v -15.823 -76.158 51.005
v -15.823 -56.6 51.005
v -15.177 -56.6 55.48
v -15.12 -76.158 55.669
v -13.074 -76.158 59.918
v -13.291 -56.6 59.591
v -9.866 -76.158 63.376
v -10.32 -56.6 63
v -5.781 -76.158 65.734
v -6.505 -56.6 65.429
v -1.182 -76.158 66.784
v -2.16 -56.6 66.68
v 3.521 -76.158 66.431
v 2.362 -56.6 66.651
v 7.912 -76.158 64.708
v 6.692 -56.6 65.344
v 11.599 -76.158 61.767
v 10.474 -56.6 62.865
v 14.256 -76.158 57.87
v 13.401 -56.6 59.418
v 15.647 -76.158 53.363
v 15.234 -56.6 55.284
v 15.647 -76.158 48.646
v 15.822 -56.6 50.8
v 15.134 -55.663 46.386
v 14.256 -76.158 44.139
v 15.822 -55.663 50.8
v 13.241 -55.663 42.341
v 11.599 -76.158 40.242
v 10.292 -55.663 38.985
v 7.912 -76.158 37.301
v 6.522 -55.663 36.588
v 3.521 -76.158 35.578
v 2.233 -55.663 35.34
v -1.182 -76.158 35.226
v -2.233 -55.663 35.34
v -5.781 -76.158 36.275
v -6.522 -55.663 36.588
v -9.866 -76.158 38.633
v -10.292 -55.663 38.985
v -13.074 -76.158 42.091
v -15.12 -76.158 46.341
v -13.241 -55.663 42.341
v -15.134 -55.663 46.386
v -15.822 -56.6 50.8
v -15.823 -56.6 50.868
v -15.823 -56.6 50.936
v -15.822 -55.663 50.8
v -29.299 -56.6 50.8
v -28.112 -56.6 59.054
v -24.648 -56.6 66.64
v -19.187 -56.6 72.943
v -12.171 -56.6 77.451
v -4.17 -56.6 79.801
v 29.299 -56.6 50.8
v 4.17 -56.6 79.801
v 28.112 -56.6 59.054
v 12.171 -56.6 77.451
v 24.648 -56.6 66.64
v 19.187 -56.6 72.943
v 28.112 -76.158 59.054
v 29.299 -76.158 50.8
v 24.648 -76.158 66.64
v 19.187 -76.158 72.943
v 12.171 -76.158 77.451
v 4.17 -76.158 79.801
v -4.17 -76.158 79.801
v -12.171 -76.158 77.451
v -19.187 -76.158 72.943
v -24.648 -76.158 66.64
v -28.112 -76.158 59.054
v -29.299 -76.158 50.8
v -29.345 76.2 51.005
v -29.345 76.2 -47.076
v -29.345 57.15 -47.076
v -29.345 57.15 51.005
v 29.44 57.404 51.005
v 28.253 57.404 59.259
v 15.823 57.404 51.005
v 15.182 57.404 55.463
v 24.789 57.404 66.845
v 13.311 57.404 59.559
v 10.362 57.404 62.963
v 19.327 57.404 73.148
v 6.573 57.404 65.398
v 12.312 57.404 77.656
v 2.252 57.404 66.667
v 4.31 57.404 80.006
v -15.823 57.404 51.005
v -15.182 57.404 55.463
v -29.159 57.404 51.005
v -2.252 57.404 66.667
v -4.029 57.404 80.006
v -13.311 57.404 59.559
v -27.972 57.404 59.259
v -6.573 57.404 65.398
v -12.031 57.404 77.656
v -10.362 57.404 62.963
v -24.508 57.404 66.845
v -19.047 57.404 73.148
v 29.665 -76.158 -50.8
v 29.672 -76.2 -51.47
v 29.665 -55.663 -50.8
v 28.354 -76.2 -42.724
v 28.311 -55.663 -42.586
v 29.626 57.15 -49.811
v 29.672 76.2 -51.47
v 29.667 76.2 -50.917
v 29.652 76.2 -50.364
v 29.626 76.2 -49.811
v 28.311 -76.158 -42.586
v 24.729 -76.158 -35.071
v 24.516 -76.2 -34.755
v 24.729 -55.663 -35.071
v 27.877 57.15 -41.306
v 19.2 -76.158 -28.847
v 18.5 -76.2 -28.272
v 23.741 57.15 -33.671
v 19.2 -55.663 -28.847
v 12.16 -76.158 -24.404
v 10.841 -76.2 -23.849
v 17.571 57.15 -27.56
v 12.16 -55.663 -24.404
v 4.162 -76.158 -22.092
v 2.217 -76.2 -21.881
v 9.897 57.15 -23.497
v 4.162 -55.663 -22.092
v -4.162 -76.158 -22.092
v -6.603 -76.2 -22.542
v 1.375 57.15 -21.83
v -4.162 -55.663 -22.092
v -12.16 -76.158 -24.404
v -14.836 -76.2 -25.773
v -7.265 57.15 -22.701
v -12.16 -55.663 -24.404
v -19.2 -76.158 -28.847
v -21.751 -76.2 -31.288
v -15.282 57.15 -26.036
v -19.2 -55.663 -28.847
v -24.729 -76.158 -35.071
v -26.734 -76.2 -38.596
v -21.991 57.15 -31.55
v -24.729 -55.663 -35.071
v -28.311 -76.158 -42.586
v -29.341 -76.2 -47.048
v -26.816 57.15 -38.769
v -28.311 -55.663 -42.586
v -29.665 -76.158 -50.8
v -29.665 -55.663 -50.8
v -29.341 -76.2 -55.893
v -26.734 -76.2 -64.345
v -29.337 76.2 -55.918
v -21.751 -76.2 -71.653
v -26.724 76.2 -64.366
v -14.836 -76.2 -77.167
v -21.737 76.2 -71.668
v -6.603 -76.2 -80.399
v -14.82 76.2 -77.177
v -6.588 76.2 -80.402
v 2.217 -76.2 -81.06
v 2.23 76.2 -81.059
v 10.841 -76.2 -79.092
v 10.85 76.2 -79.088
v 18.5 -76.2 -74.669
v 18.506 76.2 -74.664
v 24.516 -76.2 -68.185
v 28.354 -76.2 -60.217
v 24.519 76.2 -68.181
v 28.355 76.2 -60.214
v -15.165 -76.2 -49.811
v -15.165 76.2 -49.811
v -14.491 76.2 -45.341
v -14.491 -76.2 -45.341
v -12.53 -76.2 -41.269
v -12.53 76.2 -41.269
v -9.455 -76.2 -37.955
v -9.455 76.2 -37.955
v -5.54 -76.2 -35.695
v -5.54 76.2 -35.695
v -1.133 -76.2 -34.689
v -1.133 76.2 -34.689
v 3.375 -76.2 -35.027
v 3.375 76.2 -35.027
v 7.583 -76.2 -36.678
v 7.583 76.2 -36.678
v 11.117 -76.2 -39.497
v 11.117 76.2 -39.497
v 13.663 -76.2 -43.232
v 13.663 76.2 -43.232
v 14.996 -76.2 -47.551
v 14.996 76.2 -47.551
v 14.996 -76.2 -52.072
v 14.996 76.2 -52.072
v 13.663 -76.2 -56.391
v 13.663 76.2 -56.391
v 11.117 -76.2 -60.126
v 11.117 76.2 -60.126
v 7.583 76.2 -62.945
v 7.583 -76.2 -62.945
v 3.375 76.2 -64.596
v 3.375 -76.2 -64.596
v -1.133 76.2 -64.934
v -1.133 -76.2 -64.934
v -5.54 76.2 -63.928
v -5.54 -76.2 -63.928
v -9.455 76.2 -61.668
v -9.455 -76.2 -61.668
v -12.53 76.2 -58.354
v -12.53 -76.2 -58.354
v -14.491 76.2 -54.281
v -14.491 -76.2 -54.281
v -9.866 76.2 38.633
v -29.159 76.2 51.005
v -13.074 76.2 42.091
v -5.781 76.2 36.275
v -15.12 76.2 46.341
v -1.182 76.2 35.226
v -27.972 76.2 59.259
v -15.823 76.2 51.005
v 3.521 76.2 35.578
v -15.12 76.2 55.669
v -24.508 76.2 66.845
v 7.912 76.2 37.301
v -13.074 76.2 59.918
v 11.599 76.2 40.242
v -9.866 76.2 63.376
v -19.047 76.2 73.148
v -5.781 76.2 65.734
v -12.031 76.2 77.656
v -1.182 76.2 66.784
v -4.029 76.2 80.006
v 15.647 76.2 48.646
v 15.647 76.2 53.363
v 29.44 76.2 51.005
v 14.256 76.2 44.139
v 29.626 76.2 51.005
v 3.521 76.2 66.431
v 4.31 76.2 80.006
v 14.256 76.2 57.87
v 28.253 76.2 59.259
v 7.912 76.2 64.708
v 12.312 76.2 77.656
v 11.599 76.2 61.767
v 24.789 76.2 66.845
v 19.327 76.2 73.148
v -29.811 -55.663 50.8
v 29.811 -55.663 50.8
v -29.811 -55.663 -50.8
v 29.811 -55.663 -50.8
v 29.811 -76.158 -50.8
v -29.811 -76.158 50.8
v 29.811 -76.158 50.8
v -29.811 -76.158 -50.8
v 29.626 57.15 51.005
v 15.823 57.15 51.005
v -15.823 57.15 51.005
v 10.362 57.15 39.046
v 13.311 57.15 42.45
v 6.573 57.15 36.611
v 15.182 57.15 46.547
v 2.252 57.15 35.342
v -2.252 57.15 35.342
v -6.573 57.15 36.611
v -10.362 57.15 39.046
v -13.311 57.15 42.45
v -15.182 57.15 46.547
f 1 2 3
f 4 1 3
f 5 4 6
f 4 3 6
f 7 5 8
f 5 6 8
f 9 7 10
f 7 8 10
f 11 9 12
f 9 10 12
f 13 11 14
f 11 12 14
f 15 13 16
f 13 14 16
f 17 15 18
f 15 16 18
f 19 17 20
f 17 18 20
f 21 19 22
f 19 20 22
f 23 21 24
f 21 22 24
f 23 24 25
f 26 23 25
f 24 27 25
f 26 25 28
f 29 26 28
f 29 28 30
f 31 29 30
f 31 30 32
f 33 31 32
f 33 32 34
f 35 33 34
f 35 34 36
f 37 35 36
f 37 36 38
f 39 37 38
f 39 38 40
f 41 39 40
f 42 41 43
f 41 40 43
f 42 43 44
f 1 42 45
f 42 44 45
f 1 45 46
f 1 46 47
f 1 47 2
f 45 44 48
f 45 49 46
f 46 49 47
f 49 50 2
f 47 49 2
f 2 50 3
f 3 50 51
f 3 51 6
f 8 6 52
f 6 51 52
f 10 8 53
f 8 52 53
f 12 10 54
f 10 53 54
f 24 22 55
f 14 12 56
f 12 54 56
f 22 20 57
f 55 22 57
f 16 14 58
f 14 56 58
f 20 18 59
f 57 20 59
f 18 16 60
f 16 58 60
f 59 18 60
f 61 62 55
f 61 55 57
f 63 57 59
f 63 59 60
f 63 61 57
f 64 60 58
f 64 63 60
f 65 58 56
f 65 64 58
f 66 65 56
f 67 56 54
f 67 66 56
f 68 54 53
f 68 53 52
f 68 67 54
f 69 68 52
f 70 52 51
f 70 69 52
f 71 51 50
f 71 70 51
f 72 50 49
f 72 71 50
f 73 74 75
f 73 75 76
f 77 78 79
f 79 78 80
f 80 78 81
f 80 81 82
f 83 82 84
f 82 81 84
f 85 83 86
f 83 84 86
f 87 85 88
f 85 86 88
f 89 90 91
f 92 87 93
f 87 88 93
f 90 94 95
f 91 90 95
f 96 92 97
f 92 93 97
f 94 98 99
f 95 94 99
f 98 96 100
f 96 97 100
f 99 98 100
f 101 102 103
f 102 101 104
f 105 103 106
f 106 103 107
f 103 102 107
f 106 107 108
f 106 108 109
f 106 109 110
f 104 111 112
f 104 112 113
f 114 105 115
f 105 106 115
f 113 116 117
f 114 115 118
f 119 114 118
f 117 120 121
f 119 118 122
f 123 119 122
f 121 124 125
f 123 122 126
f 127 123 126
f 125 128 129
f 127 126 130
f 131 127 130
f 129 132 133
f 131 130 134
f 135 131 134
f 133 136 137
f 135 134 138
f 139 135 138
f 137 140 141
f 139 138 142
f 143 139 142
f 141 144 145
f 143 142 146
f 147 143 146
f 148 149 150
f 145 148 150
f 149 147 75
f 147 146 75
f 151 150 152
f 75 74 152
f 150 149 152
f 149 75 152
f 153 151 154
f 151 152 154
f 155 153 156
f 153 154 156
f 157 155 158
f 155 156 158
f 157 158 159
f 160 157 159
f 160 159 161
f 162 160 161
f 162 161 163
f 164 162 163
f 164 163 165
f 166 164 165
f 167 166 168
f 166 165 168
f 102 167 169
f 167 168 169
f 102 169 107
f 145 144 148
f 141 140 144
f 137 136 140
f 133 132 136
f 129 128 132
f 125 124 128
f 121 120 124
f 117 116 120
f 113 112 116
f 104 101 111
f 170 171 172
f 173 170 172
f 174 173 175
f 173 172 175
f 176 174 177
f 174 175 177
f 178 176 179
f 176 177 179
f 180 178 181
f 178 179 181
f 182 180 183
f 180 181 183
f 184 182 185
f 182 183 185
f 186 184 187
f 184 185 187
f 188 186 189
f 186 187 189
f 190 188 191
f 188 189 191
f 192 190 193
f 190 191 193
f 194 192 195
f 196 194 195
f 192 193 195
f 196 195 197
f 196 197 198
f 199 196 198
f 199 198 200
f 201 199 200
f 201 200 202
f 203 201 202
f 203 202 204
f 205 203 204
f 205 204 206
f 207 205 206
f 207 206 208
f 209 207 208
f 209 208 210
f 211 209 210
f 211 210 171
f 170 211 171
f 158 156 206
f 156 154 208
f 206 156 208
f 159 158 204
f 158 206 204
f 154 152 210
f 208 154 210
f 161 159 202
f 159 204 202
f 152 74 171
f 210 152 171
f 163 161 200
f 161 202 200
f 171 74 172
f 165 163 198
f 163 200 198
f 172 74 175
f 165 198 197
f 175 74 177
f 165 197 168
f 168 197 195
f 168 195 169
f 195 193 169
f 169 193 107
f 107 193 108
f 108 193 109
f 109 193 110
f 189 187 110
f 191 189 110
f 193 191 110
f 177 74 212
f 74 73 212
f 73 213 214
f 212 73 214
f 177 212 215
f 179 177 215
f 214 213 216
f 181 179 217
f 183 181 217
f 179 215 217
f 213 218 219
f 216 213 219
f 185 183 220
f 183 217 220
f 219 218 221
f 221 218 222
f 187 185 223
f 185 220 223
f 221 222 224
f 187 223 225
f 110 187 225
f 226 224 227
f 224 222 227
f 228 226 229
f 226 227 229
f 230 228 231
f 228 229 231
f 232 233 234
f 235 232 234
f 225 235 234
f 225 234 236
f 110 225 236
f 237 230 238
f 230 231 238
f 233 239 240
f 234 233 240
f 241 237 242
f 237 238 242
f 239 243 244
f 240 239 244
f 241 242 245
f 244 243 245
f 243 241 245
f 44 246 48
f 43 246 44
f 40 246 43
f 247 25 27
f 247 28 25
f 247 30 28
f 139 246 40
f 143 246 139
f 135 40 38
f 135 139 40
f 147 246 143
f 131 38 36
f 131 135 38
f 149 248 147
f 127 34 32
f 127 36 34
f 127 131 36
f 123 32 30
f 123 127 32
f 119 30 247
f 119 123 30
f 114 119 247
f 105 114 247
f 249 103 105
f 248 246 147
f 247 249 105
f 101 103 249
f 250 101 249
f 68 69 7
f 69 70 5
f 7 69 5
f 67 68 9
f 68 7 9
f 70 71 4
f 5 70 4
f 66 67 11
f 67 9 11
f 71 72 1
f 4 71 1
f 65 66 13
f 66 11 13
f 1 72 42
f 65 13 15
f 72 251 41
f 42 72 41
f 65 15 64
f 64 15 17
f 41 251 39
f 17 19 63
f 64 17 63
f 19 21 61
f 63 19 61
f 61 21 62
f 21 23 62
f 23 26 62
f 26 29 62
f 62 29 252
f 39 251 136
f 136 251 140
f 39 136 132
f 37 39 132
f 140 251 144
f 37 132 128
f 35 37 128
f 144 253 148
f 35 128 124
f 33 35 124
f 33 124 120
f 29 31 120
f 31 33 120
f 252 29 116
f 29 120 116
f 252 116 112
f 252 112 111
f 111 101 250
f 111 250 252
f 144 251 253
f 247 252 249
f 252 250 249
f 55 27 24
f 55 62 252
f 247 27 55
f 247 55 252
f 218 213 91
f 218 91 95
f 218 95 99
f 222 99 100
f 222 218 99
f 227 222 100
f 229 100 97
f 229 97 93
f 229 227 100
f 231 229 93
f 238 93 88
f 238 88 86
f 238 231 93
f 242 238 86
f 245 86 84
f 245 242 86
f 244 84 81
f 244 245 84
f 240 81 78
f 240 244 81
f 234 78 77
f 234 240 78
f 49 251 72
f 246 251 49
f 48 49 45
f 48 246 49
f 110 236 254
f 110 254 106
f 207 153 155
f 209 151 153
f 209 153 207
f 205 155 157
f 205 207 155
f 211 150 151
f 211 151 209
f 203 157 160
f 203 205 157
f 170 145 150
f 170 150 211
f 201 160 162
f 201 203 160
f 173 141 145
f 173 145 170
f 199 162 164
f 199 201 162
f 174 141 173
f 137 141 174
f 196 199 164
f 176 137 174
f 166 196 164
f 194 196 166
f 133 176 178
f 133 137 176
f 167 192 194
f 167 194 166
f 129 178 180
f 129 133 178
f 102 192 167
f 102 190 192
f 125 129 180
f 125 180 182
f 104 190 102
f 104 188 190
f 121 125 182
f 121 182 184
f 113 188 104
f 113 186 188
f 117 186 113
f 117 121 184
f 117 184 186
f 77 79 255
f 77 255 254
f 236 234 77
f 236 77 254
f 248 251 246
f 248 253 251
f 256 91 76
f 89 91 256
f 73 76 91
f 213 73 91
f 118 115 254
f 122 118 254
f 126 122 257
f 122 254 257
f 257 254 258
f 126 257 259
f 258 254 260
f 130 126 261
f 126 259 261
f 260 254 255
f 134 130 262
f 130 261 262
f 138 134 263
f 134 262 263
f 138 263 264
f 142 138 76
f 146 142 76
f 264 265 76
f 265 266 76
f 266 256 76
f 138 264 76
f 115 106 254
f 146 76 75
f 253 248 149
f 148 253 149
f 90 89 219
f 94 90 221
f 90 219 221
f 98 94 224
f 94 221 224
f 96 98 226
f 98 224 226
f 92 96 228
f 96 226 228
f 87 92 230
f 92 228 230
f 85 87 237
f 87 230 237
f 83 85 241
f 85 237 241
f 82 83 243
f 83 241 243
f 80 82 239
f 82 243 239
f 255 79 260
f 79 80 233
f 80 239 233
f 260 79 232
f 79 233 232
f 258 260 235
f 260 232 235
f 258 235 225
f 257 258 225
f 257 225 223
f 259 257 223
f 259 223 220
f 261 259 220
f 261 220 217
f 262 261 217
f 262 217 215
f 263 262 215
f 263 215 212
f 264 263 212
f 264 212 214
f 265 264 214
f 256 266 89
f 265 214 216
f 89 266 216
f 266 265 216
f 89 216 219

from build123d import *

# Parameters (mm, degrees)
F0_R      = 29.6723424489
F1_DEPTH  = 38.1
F2_DEPTH  = 38.1
F3_DEPTH  = 76.2
F4_W      = 59.6218928695
F4_H      = 20.4950273037
F5_DEPTH  = 50.8
F6_DEPTH  = 50.8
F8_DEPTH  = 19.558
F10_DEPTH = 19.05
F12_DEPTH = 18.796
F13_R     = 15.1650839795
F14_DEPTH = 203.2
F15_R     = 15.8233600447
F16_DEPTH = 177.8


with BuildPart() as f1:
    # F0 (on Front) → F1 (new body)
    with BuildSketch(Plane.XZ):
        with Locations((0, -51.4704622328)):
            Circle(F0_R)
    extrude(amount=F1_DEPTH)

    # F2 (add): a face of the model
    f2_faces = [f1.faces().sort_by_distance(p)[0] for p in [
        (0, -38.1, -51.4704622328),
    ]]
    extrude(f2_faces, amount=F2_DEPTH)

    # F3 (add): a face of the model
    f3_faces = [f1.faces().sort_by_distance(p)[0] for p in [
        (0, 0, -51.4704622328),
    ]]
    extrude(f3_faces, amount=F3_DEPTH)

    # F4 (on Top) → F5 (join)
    with BuildSketch(Plane.XY):
        with Locations((1.8626e-06, -65.9101381898)):
            Rectangle(F4_W, F4_H)
    extrude(amount=-F5_DEPTH)

    # F6 (add): a face of the model
    f6_faces = [f1.faces().sort_by_distance(p)[0] for p in [
        (1.8626e-06, -65.9101381898, 0),
    ]]
    extrude(f6_faces, amount=F6_DEPTH)

    # F7 (on face) → F8 (join)
    with BuildSketch(Plane.XZ.offset(76.1576518416)):
        with BuildLine():
            Line((-29.2987728327, 50.8), (29.298776558, 50.8))
            ThreePointArc((29.298776558, 50.8), (1.8626e-06, 80.0987746954), (-29.2987728327, 50.8))
        make_face()
    extrude(amount=-F8_DEPTH)

    # F9 (on face) → F10 (join)
    with BuildSketch(Plane(origin=(0, 76.2, 0), x_dir=(-1, 0, 0), z_dir=(0, 1, 0))):
        with BuildLine():
            Line((-29.6259251728, 51.0046631098), (-29.6259251728, -49.811407061))
            ThreePointArc((-29.6259251728, -49.811407061), (-1.3748108286, -21.8299865013), (29.3451528996, -47.0761582262))
            Line((29.3451528996, -47.0761582262), (29.3451528996, 51.0046631098))
            Line((29.3451528996, 51.0046631098), (-29.6259251728, 51.0046631098))
        make_face()
    extrude(amount=-F10_DEPTH)

    # F11 (on face) → F12 (join)
    with BuildSketch(Plane(origin=(0, 76.2, 0), x_dir=(-1, 0, 0), z_dir=(0, 1, 0))):
        with BuildLine():
            Line((-29.4398787195, 51.0046631098), (29.1591064463, 51.0046631098))
            ThreePointArc((29.1591064463, 51.0046631098), (-0.1403861366, 80.3041556927), (-29.4398787195, 51.0046631098))
        make_face()
    extrude(amount=-F12_DEPTH)

    # F13 (on face) → F14 (cut)
    with BuildSketch(Plane(origin=(0, 76.2, 0), x_dir=(-1, 0, 0), z_dir=(0, 1, 0))):
        with Locations((0, -49.811407061)):
            Circle(F13_R)
    extrude(amount=-F14_DEPTH, mode=Mode.SUBTRACT)

    # F15 (on face) → F16 (cut)
    with BuildSketch(Plane(origin=(0, 76.2, 0), x_dir=(-1, 0, 0), z_dir=(0, 1, 0))):
        with Locations((0, 51.0046631098)):
            Circle(F15_R)
    extrude(amount=-F16_DEPTH, mode=Mode.SUBTRACT)


solid = f1.part
